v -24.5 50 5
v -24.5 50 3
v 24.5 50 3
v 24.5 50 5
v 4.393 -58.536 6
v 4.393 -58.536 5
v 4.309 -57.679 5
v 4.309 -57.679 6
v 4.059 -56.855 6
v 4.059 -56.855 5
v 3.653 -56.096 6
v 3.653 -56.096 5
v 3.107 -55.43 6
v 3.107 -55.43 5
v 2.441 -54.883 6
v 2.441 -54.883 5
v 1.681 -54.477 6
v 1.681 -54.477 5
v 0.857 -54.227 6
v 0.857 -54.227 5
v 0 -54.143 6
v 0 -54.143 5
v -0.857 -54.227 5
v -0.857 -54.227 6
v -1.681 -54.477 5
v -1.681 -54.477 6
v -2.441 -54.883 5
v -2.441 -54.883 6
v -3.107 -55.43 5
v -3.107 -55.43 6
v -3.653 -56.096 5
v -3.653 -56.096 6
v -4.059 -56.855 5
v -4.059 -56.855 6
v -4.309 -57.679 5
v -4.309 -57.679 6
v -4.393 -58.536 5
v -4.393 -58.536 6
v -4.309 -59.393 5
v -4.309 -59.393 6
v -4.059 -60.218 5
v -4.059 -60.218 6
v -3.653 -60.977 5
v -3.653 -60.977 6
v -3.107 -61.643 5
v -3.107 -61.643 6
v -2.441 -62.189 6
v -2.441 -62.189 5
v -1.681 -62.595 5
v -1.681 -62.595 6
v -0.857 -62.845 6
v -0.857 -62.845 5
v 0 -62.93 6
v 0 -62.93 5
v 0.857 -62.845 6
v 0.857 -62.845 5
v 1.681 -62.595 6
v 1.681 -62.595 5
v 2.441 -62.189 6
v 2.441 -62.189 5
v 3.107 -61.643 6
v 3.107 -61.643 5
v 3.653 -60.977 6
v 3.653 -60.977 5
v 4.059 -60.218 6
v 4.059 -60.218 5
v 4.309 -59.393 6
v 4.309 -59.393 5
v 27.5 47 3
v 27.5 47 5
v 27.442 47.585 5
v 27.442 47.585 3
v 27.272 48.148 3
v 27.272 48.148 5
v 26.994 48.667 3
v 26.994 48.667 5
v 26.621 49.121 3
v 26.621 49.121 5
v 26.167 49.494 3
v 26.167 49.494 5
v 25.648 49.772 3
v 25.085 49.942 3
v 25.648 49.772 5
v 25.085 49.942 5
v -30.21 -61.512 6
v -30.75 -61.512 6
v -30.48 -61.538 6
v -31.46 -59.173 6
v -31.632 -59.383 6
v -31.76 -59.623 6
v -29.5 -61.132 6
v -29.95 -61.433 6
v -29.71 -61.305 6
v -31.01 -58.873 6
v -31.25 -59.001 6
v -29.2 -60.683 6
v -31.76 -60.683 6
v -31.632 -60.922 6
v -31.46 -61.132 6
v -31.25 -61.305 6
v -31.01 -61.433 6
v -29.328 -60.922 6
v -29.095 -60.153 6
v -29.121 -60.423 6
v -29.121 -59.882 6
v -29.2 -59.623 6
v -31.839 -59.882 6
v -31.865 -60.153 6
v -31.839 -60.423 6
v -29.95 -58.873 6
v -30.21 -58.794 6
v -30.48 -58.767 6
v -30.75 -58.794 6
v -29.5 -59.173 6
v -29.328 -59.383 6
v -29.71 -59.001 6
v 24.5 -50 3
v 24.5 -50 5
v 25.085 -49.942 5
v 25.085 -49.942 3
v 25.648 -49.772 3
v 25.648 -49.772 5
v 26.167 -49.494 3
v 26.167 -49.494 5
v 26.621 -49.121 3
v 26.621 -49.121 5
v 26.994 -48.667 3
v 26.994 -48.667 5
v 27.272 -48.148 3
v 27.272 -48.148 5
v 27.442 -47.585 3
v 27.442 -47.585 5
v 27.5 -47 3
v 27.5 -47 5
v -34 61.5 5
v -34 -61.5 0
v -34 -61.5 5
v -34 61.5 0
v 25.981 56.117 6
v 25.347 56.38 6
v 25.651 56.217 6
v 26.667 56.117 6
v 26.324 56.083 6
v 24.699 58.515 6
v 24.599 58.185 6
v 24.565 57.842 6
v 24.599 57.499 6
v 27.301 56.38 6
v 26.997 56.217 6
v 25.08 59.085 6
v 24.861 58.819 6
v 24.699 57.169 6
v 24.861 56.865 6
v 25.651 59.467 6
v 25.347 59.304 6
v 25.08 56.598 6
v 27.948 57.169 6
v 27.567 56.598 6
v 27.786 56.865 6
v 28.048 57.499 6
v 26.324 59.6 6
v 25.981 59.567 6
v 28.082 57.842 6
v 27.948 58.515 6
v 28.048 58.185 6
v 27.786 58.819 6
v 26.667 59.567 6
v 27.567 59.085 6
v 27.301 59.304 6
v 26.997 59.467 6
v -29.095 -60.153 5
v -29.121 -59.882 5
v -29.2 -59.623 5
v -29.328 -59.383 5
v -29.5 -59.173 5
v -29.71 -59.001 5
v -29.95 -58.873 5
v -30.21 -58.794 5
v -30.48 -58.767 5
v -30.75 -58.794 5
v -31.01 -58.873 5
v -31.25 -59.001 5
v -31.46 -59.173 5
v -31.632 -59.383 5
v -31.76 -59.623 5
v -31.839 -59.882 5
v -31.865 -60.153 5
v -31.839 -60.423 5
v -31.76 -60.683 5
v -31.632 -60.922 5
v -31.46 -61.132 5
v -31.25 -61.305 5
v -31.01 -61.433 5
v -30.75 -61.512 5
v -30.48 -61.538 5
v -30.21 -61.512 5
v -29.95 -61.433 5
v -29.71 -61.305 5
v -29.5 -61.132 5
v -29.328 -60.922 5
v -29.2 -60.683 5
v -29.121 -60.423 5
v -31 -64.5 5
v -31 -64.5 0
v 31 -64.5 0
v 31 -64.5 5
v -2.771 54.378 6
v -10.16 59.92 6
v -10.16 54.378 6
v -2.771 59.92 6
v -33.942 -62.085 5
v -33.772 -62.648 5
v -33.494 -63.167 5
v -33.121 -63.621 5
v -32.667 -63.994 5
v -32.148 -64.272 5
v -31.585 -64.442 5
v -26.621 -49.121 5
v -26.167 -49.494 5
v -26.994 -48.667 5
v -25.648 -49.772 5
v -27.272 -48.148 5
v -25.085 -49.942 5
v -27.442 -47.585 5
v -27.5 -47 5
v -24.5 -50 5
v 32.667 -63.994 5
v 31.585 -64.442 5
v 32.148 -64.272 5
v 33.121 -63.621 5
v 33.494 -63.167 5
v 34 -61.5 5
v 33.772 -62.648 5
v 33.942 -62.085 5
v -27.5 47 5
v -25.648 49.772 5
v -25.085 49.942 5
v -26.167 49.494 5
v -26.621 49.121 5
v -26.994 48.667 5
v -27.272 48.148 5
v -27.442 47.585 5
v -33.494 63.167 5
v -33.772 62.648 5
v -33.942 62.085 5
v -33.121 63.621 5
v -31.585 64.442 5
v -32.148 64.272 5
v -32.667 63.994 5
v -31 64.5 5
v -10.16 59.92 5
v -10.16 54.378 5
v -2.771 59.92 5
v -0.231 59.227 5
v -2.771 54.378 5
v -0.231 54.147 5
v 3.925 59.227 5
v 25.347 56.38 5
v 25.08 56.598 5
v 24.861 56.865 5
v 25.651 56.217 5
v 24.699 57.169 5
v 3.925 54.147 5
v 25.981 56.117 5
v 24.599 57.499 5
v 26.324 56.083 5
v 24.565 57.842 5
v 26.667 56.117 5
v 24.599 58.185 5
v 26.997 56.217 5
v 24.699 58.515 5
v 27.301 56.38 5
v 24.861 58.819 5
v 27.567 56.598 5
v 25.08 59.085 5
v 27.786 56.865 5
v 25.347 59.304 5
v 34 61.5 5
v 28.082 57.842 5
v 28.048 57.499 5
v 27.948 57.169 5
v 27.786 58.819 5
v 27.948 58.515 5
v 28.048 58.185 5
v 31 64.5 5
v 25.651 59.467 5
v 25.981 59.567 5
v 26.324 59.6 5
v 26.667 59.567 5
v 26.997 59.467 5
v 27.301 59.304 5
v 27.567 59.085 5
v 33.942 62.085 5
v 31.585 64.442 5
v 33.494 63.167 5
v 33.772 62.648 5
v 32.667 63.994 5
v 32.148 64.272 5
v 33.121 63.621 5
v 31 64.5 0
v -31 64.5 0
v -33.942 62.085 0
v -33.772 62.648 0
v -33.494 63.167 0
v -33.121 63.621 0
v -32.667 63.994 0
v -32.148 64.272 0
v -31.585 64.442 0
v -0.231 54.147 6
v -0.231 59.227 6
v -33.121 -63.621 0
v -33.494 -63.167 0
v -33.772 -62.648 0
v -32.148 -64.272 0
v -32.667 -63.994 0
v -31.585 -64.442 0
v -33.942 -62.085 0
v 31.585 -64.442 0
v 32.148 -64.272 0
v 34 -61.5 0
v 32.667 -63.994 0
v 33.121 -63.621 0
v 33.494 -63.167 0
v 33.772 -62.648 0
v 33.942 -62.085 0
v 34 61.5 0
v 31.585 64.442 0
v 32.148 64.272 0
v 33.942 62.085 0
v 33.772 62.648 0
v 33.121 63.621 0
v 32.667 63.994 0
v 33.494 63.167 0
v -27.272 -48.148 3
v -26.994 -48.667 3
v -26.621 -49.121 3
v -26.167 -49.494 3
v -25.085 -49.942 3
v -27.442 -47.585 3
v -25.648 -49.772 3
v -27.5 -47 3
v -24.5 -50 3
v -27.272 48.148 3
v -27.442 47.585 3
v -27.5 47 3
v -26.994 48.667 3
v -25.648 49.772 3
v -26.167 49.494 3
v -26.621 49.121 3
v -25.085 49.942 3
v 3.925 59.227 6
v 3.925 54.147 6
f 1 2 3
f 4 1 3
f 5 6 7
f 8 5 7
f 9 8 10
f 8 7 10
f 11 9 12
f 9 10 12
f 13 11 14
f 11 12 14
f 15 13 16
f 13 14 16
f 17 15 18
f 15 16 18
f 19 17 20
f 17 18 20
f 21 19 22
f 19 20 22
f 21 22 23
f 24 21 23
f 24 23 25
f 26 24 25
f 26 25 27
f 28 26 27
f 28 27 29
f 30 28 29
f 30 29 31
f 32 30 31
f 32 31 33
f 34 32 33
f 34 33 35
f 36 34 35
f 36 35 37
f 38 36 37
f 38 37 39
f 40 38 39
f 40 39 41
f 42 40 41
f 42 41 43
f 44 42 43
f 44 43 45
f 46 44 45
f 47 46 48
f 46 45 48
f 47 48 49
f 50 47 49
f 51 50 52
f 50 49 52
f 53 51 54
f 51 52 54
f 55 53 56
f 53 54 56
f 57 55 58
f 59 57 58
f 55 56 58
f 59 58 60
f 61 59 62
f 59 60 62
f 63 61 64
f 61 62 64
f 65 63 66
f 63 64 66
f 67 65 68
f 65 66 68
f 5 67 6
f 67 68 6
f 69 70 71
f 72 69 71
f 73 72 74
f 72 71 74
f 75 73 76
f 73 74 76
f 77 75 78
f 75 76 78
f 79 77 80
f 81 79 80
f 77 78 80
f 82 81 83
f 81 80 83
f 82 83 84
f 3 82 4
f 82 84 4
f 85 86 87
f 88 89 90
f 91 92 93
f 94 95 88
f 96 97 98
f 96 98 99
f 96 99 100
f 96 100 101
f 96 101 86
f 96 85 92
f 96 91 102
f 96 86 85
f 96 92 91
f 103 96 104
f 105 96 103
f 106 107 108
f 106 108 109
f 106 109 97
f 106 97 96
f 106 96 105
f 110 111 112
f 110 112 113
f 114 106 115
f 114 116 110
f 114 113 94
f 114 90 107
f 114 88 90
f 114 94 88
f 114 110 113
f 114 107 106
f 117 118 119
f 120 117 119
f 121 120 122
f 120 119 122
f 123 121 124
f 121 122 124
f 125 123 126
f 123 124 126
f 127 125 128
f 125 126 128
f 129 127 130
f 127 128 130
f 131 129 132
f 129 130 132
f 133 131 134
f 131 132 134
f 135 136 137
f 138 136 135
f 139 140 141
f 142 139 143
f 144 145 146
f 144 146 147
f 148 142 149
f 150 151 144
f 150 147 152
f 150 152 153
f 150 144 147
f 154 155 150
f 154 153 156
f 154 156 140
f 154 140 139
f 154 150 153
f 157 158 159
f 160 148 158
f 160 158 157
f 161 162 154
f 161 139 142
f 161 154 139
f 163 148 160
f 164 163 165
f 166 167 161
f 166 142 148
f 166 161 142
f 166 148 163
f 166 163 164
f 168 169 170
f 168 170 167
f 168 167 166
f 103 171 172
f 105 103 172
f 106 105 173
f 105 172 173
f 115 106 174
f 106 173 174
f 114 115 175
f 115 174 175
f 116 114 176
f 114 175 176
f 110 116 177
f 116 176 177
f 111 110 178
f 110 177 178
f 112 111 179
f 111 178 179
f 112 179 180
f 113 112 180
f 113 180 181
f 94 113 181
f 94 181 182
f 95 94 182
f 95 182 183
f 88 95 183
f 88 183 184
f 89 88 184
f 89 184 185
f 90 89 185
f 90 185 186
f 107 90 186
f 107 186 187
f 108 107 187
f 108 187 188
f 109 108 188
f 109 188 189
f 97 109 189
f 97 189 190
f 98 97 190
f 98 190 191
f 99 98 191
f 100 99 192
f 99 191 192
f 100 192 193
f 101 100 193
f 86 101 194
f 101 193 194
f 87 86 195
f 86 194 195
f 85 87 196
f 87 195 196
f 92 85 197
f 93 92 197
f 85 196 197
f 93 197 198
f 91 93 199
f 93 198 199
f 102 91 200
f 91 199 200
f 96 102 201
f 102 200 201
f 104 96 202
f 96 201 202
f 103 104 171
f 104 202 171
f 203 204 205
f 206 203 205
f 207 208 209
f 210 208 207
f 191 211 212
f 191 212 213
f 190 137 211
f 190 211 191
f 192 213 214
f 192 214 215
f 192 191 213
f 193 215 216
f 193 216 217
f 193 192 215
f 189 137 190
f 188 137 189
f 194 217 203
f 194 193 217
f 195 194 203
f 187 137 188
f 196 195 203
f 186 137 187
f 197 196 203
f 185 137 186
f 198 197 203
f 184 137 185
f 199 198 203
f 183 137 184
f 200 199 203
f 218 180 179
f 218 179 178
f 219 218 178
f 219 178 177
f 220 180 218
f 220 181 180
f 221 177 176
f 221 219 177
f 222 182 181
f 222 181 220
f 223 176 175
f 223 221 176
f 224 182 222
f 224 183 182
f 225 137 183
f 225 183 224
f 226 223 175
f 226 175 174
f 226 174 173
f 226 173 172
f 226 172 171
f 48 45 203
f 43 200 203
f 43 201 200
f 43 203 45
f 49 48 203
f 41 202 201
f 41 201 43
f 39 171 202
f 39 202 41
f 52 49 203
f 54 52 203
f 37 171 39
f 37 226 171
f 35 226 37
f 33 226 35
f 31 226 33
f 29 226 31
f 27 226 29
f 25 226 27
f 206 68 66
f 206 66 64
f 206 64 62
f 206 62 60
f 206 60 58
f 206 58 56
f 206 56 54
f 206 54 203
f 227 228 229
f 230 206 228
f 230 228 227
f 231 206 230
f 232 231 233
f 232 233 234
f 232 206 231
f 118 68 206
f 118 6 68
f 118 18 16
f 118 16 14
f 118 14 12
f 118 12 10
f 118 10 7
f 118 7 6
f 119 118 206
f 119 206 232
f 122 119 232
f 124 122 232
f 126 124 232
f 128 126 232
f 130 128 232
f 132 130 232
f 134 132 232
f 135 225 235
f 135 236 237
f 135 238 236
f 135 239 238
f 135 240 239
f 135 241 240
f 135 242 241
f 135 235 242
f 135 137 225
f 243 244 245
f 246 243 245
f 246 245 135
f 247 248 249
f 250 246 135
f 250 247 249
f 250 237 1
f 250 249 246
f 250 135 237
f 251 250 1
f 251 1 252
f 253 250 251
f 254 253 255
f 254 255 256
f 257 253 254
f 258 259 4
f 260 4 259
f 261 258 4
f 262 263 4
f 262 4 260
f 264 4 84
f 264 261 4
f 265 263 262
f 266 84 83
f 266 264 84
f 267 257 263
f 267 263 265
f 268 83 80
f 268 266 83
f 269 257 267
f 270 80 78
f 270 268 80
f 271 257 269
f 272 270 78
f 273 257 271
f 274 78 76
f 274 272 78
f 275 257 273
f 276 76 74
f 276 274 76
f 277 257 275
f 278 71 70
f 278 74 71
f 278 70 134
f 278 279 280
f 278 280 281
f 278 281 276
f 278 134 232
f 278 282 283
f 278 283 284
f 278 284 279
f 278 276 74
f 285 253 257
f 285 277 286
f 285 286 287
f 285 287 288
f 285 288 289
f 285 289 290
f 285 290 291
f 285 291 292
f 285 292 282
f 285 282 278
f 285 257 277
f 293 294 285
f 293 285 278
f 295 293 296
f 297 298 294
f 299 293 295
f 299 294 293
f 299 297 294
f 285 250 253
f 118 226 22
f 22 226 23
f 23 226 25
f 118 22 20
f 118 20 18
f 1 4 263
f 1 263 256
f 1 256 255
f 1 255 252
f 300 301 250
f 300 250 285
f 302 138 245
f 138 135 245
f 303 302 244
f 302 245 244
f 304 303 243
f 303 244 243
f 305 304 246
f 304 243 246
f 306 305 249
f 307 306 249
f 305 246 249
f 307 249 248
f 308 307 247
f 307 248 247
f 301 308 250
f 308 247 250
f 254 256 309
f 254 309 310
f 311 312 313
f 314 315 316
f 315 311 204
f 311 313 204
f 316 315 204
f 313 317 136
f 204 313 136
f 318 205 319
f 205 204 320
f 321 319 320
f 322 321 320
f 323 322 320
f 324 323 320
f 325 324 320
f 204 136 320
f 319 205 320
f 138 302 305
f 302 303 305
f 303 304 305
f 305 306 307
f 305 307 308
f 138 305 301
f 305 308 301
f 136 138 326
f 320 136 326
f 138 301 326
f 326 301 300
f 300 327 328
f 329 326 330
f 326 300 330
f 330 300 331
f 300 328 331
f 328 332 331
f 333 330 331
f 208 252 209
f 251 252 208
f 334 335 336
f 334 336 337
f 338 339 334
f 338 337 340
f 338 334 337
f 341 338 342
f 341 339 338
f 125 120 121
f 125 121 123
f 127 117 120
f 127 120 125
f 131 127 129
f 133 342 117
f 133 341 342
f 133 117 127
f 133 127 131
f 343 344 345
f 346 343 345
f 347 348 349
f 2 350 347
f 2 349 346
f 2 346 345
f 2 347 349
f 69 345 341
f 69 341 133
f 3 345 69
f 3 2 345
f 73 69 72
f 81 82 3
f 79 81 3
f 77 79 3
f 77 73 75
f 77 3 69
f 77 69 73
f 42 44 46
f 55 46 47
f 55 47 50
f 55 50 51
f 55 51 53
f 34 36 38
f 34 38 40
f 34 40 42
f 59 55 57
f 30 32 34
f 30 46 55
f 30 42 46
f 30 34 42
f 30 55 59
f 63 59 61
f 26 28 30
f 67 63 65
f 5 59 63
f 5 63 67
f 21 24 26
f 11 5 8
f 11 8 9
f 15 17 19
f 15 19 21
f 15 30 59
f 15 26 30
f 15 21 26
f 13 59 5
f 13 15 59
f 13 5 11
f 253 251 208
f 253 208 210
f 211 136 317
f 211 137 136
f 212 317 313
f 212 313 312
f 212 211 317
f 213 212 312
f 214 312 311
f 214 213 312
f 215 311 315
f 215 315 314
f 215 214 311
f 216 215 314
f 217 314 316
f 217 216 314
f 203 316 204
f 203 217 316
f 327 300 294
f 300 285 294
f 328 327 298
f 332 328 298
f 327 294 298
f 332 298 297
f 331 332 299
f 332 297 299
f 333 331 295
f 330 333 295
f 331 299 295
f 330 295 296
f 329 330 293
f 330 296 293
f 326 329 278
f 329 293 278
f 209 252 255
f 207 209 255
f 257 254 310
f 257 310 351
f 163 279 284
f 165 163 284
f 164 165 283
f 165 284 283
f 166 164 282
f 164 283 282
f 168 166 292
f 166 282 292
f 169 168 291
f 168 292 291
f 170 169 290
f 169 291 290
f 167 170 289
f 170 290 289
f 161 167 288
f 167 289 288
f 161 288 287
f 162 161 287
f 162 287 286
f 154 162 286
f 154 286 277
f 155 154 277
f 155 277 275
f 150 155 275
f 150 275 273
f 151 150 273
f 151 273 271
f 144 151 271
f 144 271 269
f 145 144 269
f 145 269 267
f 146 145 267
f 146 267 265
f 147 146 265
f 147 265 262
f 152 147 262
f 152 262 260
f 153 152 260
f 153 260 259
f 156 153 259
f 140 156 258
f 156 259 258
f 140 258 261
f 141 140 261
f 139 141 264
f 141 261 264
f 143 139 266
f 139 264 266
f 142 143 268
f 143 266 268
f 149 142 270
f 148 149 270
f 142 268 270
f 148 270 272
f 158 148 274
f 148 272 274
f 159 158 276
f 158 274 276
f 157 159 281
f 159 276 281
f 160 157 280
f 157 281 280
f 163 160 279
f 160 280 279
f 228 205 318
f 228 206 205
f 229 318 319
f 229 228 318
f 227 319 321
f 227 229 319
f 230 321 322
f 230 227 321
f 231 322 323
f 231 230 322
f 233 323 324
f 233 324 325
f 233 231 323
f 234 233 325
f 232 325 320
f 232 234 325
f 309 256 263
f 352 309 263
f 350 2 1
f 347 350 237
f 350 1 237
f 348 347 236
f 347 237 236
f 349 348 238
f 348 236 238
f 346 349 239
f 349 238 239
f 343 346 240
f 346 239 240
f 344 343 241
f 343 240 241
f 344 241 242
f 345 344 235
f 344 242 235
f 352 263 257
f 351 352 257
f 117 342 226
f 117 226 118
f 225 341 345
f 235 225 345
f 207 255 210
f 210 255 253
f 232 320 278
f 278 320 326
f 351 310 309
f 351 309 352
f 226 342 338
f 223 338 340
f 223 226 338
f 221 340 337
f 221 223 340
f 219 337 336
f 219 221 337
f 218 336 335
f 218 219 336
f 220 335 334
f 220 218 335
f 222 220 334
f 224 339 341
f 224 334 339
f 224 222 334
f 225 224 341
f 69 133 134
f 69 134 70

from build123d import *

# Parameters (mm, degrees)
F1_W      = 68
F1_H      = 129
F1_W_2    = 55
F1_H_2    = 100
F2_DEPTH  = 5
F3_R      = 3
F4_R      = 3
F5_W      = 55
F5_H      = 100
F6_DEPTH  = 3
F0_R      = 4.3933448382
F7_DEPTH  = 6
F8_W      = 4.1563683189
F8_H      = 5.0799995661
F9_DEPTH  = 6
F10_W     = 7.3890909553
F10_H     = 5.5418238044
F11_DEPTH = 6
F12_R     = 1.7585544961
F13_DEPTH = 6
F24_R     = 1.3854540884
F25_DEPTH = 6


# Not quite as in the source:
# - the program builds the solid bodies; features that only make, move or delete a surface that nothing else refers to are left out


with BuildPart() as f2:
    # F1 (on Top) → F2 (new body)
    with BuildSketch(Plane.XY):
        Rectangle(F1_W, F1_H)
        Rectangle(F1_W_2, F1_H_2, mode=Mode.SUBTRACT)
    extrude(amount=F2_DEPTH)

    # F3
    f3_edges = [f2.edges().sort_by_distance(p)[0] for p in [
        (-34, 64.5, 2.5),
        (34, 64.5, 2.5),
        (34, -64.5, 2.5),
        (-34, -64.5, 2.5),
    ]]
    fillet(f3_edges, radius=F3_R)

    # F4
    f4_edges = [f2.edges().sort_by_distance(p)[0] for p in [
        (-27.5, 50, 2.5),
        (27.5, 50, 2.5),
        (-27.5, -50, 2.5),
        (27.5, -50, 2.5),
    ]]
    fillet(f4_edges, radius=F4_R)

    # F5 (on Top) → F6 (join)
    with BuildSketch(Plane.XY):
        Rectangle(F5_W, F5_H)
    extrude(amount=F6_DEPTH)

    # F0 (on Top) → F7 (join)
    with BuildSketch(Plane.XY):
        with Locations((0, -58.5363544524)):
            Circle(F0_R)
    extrude(amount=F7_DEPTH)

    # F8 (on Top) → F9 (join)
    with BuildSketch(Plane.XY):
        with Locations((1.8472720403, 56.6872768104)):
            Rectangle(F8_W, F8_H)
    extrude(amount=F9_DEPTH)

    # F10 (on Top) → F11 (join)
    with BuildSketch(Plane.XY):
        with Locations((-6.4654545859, 57.1491010487)):
            Rectangle(F10_W, F10_H)
    extrude(amount=F11_DEPTH)

    # F12 (on Top) → F13 (join)
    with BuildSketch(Plane.XY):
        with Locations((26.3236332685, 57.8418262303)):
            Circle(F12_R)
    extrude(amount=F13_DEPTH)

    # F24 (on Top) → F25 (join)
    with BuildSketch(Plane.XY):
        with Locations((-30.4799992591, -60.15272066)):
            Circle(F24_R)
    extrude(amount=F25_DEPTH)


solid = f2.part
